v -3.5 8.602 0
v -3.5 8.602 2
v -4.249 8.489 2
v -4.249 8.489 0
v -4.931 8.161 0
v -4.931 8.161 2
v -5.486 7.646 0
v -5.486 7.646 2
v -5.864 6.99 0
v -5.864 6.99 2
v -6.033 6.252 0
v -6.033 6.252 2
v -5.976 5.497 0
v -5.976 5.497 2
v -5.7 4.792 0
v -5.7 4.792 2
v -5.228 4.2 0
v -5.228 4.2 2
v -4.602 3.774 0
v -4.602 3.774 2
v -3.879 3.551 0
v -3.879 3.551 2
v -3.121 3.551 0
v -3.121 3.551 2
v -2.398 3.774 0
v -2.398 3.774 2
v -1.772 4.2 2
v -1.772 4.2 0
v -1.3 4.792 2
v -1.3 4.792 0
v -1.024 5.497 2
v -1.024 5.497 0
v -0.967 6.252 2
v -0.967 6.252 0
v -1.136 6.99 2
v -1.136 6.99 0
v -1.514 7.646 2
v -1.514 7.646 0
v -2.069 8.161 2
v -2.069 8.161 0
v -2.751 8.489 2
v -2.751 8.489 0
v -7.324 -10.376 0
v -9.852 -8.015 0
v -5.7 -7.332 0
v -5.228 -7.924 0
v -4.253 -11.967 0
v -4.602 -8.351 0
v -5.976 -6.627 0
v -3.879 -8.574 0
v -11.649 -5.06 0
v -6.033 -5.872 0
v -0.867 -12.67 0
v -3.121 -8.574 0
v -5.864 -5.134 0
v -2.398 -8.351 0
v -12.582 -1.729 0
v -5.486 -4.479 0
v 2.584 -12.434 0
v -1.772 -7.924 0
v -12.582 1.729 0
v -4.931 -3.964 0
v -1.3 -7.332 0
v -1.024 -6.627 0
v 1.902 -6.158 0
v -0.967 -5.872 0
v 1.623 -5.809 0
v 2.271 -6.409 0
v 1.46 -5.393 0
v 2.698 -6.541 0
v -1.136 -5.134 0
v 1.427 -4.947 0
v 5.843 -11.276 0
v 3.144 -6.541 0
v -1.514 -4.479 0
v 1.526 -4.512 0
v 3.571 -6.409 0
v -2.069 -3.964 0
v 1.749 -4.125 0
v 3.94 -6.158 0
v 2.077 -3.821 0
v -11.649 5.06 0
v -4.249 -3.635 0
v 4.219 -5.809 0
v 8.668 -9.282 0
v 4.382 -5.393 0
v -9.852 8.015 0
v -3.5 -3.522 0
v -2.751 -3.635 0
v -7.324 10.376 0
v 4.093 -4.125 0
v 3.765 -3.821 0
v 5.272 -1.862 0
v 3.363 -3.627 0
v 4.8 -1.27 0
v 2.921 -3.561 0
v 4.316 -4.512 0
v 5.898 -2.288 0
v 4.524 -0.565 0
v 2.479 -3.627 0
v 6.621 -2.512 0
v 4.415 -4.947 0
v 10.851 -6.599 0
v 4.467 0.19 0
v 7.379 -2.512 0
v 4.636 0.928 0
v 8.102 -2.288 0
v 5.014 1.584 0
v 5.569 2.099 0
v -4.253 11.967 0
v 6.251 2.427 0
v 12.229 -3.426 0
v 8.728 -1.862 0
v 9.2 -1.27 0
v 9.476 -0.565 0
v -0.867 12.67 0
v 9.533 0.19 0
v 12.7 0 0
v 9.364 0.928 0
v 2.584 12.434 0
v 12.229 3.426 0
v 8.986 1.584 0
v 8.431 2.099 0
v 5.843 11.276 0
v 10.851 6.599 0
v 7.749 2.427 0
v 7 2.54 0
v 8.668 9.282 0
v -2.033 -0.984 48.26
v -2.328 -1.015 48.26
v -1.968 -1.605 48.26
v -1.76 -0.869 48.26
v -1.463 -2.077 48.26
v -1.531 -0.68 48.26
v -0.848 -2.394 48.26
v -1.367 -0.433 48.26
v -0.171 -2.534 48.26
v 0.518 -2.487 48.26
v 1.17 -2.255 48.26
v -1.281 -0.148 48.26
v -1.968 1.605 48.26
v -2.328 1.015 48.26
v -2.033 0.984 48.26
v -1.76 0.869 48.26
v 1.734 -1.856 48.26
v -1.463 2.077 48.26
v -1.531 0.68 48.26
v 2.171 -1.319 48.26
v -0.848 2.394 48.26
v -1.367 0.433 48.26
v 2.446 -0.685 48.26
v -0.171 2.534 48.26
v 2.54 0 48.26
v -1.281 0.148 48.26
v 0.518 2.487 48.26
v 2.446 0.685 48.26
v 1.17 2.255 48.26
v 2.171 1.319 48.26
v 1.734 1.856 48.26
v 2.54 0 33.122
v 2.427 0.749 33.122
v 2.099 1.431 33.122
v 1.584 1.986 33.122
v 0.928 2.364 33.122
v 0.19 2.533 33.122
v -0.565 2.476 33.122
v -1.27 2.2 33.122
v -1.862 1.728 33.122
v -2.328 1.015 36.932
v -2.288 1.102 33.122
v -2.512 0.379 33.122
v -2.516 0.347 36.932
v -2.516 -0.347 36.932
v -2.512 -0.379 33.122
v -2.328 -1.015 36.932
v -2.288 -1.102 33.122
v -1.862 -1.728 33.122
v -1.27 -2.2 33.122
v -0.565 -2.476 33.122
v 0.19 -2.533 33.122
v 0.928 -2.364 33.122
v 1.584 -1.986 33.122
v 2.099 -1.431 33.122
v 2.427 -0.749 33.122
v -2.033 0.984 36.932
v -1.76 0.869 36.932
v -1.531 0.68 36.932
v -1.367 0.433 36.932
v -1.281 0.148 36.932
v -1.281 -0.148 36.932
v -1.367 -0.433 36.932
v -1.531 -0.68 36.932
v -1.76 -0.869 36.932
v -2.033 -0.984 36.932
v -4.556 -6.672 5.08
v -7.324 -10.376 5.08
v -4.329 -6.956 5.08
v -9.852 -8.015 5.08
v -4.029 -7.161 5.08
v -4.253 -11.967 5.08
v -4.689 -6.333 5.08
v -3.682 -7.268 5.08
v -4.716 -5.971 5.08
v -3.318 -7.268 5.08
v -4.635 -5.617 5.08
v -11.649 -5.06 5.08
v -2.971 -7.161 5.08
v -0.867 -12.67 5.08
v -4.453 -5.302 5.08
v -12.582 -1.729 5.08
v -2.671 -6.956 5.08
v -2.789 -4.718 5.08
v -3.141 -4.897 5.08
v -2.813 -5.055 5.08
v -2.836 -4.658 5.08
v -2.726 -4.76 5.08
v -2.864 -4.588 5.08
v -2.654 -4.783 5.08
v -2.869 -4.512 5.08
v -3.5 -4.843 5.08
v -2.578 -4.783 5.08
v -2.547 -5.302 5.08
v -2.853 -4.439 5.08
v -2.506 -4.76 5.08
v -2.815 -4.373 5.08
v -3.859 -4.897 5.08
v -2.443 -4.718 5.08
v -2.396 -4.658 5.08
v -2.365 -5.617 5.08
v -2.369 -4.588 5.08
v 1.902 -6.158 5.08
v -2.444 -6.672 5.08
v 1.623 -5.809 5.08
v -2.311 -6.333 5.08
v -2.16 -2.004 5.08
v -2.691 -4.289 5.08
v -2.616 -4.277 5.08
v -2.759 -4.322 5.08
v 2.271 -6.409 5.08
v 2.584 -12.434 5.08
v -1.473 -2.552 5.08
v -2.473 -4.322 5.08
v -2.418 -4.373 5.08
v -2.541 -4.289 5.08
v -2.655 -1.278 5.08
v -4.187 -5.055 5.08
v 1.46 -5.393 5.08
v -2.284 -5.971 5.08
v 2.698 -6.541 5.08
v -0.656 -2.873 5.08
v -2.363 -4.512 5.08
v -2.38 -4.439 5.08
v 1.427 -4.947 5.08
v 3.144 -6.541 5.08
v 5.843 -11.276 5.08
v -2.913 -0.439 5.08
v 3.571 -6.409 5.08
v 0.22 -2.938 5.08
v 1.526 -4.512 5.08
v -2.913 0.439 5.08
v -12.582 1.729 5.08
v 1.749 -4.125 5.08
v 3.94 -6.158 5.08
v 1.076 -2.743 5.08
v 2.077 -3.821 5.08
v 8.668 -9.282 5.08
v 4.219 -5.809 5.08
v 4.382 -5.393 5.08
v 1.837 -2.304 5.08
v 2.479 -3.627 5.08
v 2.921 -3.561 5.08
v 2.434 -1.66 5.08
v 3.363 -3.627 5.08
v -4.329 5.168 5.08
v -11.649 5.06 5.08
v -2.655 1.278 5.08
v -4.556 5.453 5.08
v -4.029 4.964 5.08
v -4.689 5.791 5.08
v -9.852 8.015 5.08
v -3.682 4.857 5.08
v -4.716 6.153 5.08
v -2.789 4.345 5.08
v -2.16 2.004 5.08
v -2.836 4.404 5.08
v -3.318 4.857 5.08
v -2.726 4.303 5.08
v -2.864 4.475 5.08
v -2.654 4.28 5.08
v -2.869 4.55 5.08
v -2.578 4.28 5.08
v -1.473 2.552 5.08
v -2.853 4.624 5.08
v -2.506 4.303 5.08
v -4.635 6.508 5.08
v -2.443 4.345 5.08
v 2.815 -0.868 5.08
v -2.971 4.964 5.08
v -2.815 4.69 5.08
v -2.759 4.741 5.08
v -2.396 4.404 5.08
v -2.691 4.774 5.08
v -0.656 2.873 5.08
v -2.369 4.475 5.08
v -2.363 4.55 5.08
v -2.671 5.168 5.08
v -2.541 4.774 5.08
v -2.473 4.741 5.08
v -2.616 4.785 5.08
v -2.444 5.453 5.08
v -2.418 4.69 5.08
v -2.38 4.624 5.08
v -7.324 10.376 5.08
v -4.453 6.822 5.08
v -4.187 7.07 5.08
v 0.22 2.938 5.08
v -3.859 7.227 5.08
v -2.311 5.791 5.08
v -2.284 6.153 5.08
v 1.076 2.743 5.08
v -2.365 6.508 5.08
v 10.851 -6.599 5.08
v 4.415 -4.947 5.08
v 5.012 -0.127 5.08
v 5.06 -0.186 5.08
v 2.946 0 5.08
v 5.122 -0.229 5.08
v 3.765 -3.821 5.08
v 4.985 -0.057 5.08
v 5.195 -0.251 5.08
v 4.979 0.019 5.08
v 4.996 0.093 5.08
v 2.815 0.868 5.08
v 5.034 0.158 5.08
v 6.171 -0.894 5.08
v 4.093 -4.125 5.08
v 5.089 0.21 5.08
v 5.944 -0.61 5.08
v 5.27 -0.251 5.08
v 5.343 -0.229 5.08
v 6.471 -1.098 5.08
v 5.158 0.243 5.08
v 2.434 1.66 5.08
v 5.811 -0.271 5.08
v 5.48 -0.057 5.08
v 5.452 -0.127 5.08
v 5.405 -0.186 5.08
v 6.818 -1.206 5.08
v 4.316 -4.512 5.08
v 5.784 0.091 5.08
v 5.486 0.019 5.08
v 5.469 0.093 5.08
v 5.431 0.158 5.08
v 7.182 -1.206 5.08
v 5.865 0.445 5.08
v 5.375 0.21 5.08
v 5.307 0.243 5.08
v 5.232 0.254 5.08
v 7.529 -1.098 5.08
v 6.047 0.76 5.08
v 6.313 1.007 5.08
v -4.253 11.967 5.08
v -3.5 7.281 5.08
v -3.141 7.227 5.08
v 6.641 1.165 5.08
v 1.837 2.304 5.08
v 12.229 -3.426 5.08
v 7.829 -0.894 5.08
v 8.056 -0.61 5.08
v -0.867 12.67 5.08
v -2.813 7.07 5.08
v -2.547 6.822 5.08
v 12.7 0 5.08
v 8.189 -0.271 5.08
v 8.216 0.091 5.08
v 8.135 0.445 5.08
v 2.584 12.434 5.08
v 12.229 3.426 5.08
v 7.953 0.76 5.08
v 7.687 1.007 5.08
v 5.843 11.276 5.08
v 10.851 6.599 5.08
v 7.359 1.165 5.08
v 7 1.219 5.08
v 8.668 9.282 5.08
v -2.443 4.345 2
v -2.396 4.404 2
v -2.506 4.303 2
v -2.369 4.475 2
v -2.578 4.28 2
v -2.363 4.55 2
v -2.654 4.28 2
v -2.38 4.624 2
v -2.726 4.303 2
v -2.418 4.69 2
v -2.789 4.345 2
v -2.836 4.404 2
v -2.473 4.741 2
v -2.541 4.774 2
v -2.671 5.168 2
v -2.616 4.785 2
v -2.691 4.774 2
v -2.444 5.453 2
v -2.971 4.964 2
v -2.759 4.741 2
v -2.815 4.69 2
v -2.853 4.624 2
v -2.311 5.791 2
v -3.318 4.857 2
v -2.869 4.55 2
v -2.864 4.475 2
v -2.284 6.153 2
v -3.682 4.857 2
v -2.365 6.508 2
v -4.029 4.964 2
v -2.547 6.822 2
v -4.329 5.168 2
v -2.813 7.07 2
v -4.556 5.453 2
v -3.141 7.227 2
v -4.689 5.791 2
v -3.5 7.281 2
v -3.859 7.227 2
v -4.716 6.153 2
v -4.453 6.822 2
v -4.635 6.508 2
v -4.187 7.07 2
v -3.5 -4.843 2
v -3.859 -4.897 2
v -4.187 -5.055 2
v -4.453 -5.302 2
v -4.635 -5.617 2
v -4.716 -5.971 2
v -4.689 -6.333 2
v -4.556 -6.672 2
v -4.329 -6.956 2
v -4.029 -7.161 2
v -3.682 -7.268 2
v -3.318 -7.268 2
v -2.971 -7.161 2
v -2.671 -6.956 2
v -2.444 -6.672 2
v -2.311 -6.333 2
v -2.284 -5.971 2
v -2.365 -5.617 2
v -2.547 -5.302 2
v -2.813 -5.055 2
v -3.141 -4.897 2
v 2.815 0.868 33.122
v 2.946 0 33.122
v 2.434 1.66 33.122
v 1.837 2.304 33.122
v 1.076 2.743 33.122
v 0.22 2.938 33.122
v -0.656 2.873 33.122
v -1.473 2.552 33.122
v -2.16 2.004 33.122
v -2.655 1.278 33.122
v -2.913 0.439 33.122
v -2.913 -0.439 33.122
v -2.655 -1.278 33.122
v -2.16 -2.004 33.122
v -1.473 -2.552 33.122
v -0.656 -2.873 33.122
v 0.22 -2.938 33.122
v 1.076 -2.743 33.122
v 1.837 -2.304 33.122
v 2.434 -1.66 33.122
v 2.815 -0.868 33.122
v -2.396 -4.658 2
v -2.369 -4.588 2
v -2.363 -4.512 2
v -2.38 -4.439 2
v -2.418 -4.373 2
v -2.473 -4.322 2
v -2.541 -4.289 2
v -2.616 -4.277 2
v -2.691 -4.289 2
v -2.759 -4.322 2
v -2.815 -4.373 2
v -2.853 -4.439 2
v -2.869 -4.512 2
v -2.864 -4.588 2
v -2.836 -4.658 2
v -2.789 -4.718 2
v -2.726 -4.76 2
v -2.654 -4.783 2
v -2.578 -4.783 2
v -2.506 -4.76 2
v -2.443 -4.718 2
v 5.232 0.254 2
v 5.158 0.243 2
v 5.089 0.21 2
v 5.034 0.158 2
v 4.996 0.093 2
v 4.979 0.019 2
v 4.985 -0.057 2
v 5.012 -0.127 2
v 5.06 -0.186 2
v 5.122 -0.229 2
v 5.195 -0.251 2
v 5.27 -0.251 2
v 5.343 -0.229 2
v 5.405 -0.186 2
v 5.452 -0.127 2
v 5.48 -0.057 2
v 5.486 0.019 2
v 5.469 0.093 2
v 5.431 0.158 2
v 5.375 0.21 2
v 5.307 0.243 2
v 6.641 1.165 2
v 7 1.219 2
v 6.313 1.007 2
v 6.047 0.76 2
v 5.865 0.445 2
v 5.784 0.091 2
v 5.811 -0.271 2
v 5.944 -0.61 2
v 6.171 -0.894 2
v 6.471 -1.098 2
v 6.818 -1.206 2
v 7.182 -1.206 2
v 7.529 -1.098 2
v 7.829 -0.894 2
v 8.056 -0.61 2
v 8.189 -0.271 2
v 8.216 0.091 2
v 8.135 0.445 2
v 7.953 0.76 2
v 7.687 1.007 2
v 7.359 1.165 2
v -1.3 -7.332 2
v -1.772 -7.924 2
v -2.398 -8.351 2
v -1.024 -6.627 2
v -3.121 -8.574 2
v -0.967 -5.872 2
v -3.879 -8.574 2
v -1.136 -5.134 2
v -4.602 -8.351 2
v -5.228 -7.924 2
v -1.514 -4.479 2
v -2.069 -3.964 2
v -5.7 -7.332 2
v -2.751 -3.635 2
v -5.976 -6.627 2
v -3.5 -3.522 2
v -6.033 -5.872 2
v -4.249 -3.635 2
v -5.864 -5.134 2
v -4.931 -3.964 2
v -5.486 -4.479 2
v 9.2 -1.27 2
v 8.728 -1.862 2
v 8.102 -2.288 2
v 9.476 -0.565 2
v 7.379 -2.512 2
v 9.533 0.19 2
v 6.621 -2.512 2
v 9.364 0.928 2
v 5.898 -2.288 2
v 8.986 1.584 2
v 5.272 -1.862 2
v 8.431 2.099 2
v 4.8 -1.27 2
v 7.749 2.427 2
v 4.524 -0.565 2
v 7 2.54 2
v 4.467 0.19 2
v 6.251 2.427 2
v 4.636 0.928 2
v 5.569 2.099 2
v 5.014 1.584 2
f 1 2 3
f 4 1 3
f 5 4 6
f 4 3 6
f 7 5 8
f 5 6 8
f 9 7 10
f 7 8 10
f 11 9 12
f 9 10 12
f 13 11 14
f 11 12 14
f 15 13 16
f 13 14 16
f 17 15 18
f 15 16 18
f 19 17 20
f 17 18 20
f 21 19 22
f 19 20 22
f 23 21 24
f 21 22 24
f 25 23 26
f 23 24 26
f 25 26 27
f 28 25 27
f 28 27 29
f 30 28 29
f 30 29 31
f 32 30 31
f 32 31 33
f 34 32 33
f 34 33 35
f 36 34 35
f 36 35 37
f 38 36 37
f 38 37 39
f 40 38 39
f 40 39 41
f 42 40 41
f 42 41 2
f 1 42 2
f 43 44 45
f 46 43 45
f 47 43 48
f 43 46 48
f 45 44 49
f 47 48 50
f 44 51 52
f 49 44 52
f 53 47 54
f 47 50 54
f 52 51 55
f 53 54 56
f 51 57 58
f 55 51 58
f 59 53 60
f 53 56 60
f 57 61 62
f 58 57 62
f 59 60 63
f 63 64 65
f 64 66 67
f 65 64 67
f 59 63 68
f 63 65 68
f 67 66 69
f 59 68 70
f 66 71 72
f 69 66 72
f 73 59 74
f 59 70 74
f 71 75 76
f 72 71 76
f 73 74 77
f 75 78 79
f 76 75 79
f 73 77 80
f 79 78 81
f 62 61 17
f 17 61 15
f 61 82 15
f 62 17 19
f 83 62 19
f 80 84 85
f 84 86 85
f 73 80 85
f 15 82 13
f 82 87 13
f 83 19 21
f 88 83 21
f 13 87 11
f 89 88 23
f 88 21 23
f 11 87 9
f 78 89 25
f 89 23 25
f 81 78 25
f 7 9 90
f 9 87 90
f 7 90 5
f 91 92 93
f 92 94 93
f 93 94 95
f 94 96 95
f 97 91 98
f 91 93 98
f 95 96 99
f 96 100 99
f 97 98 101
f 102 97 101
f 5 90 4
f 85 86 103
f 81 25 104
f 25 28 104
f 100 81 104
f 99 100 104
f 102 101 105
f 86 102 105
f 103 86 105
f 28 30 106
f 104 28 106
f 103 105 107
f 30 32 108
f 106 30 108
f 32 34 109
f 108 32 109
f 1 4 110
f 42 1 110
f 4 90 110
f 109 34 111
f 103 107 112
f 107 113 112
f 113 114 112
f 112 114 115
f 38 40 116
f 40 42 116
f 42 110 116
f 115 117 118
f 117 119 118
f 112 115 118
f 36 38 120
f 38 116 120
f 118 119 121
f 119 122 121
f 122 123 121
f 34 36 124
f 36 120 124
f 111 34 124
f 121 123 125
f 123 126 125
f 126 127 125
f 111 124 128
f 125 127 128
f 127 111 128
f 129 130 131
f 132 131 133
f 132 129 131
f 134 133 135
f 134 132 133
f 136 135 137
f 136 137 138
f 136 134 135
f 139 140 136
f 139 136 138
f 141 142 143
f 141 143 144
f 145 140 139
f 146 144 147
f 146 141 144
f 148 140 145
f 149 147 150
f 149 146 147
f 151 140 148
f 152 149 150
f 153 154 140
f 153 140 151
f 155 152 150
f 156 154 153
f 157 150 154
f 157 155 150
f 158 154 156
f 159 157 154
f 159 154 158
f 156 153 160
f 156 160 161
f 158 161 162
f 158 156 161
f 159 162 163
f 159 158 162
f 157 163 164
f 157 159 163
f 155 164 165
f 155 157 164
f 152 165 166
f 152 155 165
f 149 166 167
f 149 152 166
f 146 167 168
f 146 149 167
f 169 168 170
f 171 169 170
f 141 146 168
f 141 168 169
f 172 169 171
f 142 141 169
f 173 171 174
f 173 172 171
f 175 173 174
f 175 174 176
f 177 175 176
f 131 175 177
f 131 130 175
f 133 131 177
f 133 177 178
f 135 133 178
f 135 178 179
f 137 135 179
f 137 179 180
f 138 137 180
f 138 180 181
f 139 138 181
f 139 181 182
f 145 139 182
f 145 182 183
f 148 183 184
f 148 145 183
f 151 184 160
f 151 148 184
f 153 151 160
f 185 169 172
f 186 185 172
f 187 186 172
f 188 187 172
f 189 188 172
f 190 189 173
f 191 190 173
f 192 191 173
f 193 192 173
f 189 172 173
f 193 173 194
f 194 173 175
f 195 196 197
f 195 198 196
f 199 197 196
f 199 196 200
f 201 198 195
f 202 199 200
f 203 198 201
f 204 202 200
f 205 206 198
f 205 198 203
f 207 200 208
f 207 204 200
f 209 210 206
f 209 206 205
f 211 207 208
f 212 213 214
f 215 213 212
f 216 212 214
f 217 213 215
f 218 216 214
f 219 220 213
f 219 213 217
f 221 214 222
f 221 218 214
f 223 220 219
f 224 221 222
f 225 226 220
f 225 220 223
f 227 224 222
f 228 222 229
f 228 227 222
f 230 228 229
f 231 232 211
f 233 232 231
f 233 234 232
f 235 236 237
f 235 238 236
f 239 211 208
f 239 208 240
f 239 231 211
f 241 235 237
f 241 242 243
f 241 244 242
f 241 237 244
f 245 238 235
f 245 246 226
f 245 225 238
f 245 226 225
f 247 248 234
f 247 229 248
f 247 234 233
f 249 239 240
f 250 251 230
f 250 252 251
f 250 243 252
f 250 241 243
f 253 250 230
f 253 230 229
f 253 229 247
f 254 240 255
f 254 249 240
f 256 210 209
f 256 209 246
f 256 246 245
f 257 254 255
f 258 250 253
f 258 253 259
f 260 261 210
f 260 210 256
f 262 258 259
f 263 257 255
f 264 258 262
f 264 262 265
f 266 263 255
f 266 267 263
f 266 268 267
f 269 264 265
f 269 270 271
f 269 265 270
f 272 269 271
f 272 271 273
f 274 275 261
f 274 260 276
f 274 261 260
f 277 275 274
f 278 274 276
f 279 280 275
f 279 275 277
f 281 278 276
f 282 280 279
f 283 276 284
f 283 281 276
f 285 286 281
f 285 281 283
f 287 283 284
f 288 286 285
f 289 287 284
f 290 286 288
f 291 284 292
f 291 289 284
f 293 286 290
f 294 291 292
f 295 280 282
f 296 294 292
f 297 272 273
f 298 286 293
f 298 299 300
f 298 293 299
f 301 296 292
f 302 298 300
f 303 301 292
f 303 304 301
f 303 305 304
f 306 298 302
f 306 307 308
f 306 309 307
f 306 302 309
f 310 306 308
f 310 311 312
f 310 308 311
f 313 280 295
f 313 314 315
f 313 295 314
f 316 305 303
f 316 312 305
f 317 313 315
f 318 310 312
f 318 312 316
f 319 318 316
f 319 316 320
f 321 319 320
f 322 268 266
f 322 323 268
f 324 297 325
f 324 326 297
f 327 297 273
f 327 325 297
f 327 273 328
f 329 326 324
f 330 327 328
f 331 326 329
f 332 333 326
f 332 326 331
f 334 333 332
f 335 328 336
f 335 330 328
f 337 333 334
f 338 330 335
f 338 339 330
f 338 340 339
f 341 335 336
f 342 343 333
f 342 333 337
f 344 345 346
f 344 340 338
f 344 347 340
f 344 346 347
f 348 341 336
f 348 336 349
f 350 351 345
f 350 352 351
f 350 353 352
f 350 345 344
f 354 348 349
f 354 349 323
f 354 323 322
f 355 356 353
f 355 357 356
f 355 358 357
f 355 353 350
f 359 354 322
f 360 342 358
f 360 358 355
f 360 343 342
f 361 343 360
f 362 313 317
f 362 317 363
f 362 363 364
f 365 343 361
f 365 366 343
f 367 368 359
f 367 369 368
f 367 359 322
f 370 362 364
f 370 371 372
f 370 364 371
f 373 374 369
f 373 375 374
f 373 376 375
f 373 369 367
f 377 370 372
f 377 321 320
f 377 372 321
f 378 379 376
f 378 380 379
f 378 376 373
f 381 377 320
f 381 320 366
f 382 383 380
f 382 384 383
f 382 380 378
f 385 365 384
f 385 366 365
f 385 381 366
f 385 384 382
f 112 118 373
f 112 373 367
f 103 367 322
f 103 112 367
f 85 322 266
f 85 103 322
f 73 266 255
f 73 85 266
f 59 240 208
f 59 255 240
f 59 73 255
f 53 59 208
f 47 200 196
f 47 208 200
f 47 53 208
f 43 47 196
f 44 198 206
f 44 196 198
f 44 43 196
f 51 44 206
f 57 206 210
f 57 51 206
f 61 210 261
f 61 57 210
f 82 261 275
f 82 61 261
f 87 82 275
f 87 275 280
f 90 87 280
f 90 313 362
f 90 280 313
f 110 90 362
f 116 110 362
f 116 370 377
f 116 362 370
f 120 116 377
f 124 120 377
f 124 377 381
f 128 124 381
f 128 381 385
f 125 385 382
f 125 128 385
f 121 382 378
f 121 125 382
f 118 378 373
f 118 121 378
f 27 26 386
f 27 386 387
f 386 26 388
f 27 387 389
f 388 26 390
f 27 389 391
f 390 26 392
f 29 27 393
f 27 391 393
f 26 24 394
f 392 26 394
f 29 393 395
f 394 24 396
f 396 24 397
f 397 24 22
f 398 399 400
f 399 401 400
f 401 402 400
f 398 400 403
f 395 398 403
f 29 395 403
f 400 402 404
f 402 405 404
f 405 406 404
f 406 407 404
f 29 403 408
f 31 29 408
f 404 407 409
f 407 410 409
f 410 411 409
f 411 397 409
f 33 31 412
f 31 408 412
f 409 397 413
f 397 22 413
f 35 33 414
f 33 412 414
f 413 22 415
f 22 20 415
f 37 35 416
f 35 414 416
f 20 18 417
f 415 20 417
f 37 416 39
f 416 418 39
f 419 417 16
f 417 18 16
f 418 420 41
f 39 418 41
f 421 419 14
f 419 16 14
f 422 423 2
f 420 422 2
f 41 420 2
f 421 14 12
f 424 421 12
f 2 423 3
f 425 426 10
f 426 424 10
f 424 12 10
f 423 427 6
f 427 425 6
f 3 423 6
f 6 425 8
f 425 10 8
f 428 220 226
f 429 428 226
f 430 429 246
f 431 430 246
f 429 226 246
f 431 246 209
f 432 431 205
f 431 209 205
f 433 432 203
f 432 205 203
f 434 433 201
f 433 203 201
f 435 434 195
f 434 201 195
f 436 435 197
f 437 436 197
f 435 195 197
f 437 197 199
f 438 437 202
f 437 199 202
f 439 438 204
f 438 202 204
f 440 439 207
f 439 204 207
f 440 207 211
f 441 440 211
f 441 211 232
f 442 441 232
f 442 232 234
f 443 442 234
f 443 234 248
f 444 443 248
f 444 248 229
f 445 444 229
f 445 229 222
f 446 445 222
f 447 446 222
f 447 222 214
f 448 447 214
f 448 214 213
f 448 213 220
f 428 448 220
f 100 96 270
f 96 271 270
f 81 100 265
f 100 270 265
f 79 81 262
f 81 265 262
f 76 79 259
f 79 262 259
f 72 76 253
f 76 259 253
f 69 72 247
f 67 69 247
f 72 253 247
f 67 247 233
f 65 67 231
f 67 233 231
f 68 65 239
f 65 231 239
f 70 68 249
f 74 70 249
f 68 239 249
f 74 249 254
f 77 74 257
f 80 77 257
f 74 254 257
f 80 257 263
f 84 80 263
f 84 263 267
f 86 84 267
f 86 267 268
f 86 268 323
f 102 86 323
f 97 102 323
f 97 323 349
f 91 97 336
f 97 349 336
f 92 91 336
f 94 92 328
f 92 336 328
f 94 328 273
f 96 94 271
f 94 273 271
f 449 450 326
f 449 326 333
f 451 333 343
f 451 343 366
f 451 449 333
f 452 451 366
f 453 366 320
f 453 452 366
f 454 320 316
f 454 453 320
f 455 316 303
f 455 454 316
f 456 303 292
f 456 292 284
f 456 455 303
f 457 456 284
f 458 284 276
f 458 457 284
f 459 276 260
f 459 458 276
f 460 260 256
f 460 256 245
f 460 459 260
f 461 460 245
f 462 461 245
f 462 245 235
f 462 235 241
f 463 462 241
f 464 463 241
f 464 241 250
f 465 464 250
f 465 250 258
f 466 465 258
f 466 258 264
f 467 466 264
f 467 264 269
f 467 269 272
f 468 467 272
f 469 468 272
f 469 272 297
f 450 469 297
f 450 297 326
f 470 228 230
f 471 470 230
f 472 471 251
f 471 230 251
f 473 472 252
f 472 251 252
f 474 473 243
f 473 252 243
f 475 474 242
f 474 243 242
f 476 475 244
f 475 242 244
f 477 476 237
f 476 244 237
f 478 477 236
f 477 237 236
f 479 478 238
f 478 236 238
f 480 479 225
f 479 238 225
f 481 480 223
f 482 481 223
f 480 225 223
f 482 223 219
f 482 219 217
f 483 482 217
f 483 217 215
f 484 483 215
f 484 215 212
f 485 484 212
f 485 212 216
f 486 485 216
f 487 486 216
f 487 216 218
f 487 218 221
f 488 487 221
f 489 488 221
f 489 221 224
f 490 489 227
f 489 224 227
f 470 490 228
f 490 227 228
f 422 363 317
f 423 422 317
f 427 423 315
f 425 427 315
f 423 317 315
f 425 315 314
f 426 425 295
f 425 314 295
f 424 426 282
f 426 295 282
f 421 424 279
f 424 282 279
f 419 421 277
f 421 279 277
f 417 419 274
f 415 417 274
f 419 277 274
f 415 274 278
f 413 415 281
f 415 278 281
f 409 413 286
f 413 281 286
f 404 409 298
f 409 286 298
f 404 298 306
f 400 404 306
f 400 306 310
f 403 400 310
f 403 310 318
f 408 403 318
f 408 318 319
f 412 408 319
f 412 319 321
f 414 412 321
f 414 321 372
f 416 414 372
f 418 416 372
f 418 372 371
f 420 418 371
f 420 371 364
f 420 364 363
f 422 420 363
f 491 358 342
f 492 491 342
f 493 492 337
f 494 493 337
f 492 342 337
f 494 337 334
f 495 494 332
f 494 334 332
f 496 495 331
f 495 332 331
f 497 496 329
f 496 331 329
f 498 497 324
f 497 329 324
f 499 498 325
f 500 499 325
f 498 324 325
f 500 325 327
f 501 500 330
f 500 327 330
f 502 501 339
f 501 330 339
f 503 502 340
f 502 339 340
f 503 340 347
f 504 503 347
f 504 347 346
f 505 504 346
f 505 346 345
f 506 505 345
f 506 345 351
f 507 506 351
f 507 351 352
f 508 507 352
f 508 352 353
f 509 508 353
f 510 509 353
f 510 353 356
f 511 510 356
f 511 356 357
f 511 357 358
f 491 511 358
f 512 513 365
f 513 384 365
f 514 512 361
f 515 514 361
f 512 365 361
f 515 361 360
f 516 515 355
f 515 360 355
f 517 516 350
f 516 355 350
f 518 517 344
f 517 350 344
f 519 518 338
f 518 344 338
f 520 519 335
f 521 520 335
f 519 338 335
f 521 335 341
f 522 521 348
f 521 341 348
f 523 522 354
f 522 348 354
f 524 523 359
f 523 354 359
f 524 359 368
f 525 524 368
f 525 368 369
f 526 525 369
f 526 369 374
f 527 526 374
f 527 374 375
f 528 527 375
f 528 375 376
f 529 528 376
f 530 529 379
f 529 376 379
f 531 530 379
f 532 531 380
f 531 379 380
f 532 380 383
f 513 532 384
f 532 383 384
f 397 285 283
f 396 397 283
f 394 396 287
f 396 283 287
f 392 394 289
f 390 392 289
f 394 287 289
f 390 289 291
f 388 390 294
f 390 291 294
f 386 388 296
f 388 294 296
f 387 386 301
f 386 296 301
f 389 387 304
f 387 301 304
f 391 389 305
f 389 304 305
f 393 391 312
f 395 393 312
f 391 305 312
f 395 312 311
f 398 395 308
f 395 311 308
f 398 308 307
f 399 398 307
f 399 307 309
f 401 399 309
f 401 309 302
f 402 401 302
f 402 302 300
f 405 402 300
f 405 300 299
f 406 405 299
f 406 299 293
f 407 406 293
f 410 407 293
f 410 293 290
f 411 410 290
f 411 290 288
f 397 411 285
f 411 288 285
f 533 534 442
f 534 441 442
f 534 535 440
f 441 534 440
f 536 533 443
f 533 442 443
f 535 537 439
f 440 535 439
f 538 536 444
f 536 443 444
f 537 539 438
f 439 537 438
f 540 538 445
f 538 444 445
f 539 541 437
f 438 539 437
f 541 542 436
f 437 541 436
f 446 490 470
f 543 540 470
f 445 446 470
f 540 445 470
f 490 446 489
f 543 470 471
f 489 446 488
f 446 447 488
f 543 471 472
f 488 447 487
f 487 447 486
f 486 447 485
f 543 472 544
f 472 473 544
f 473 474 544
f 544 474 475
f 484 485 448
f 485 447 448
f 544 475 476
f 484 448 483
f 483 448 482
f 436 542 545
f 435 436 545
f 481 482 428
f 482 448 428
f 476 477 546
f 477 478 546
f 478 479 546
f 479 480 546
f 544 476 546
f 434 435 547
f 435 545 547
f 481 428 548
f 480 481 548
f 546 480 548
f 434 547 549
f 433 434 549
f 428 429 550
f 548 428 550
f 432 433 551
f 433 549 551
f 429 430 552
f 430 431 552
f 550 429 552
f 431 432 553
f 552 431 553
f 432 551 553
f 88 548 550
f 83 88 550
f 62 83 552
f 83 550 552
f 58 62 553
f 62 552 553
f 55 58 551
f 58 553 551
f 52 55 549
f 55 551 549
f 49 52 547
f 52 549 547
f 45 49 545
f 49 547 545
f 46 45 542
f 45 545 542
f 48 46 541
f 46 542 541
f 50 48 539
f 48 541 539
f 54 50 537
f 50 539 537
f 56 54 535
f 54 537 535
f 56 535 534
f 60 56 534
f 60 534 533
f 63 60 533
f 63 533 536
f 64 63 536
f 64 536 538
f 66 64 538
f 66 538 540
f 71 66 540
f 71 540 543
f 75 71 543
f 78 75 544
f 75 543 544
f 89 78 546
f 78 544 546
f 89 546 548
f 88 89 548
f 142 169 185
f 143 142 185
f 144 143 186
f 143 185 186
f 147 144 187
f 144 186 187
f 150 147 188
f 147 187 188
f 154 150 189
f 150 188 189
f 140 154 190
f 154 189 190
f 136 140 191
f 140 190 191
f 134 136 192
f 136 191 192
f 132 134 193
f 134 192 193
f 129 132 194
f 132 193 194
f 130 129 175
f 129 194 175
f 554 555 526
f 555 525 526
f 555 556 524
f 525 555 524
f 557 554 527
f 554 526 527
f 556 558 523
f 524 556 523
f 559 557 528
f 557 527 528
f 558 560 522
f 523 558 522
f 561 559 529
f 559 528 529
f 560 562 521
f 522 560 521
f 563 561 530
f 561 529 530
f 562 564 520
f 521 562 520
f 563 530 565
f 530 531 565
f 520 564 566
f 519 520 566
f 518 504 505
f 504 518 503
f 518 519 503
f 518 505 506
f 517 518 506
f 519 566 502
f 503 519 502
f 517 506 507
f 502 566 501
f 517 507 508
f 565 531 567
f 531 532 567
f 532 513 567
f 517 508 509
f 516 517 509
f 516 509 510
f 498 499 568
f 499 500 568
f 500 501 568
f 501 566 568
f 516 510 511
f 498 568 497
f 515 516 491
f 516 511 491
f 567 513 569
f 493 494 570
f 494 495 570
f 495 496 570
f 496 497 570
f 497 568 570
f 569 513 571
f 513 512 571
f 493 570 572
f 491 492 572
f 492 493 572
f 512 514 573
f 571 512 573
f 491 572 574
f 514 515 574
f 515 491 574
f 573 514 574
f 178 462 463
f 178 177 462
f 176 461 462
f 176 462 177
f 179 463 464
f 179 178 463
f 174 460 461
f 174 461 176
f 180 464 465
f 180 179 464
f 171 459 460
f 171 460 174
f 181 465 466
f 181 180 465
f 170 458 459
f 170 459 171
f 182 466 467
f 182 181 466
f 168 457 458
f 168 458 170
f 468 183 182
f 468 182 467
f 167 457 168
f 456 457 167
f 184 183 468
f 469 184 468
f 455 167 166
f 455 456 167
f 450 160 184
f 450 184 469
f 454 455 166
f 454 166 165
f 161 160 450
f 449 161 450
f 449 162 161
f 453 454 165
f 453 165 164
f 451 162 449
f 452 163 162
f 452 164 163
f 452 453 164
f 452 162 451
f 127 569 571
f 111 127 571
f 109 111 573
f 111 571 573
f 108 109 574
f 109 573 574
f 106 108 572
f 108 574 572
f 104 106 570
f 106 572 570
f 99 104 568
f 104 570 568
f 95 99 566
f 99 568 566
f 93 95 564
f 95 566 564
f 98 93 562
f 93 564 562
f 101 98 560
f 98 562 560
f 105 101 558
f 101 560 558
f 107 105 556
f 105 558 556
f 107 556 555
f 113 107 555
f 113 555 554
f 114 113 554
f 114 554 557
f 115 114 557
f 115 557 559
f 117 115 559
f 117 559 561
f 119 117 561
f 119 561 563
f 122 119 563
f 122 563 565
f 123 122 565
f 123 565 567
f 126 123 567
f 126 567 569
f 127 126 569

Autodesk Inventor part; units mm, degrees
ref_plane "YZ Plane" through (0, 0, 0) normal (1, 0, 0) x (0, 1, 0)
ref_plane "XZ Plane" through (0, 0, 0) normal (0, 1, 0) x (-1, 0, 0)
ref_plane "XY Plane" through (0, 0, 0) normal (0, 0, 1) x (1, 0, 0)
sketch "Sketch1" plane through (0, 0, 0) normal (0, 0, 1) x (1, 0, 0)
  circle A0 centre (0, 0) radius 12.7
  dimension "d0" = 25.4
extrude "Extrusion1" add sketch "Sketch1" along normal blind 48.26
sketch "Sketch2" plane through (0, 0, 48.26) normal (0, 0, 1) x (1, 0, 0)
  circle A0 centre (0, 0) radius 12.7 projected
  circle A1 centre (0, 0) radius 2.9464
  dimension "d3" = 5.8928
extrude "Extrusion2" cut sketch "Sketch2" against normal blind 43.18
sketch "Sketch3" plane through (0, 0, 0) normal (0, 0, -1) x (-1, 0, 0)
  circle A0 centre (-7, 0) radius 0.847
  circle A1 centre (3.5, 6.0622) radius 0.847
  arc A2 (5.3333, -1.3437) -> (5.3333, 1.3437) centre (6, 0) ccw
  circle A3 centre (3.5, -6.0622) radius 0.847
  circle A4 centre (6, 0) radius 1.5
hole "Hole1" at (7, 0, 0) at (-3.5, -6.0622, 0) at (-3.5, 6.0622, 0) direction (0, 0, 1) diameter 2.4384 end through all counterbore diameter 5.08 counterbore depth 2 clearance for "Flat Head Machine Screw (82)" size "#2" standard "Ansi Unified Screw Threads"
sketch "Sketch4" plane through (0, 0, 0) normal (0, 0, -1) x (-1, 0, 0)
  circle A0 centre (0, 0) radius 12.7 projected
  line L0 (0, 0) -> (-2.921, -5.0593)
  line L1 (0, -17.78) -> (0, 17.78) projected
  line L2 (17.78, 0) -> (-17.78, 0) projected
  dimension "d37" = 60
  dimension "d38" = 5.842
hole "Hole2" at (2.921, -5.0593, 0) direction (0, 0, 1) diameter 2.9972 end through all
sketch "Sketch5" plane through (0, 0, 5.08) normal (0, 0, 1) x (1, 0, 0)
  circle A0 centre (-3.5, 6.0622) radius 1.2192 projected
  circle A1 centre (-3.5, -6.0622) radius 1.2192 projected
  circle A2 centre (7, 0) radius 1.2192 projected
  circle A3 centre (0, 0) radius 2.9464 projected
  circle A4 centre (0, 0) radius 12.7 projected
  circle A5 centre (2.921, -5.0593) radius 1.4986 projected
ref_plane "Top Ref" through (0, 0, 37.4401) normal (0, 0, 1) x (1, 0, 0)
ref_plane "Bottom Ref" through (0, 0, 15.08) normal (0, 0, 1) x (1, 0, 0)
ref_plane "Work Plane4" through (0, 0, 33.6301) normal (0, 0, 1) x (1, 0, 0)
ref_plane "Work Plane5" through (0, 0, 33.1221) normal (0, 0, 1) x (1, 0, 0)
ref_plane "Work Plane6" through (0, 0, 36.9321) normal (0, 0, 1) x (1, 0, 0)
sketch "Sketch6" plane through (0, 0, 48.26) normal (0, 0, 1) x (1, 0, 0)
  circle A0 centre (0, 0) radius 2.9464 projected
  circle A1 centre (0, 0) radius 2.54
  dimension "d25" = 5.08
extrude "Extrusion3" cut sketch "Sketch6" against normal up to surface (15.1379 mm away)
sketch "Sketch7" plane through (0, 0, 48.26) normal (0, 0, 1) x (1, 0, 0)
  circle A0 centre (0, 0) radius 2.54 projected
  circle A1 centre (-2.286, 0) radius 1.016
  dimension "d28" = 2.032
  dimension "d29" = 2.286
hole "Hole3" at (-2.286, 0, 48.26) direction (0, 0, -1) diameter 2.032 depth 11.3279
sketch "Sketch8" plane through (0, 0, 0) normal (0, 0, -1) x (-1, 0, 0)
  circle A0 centre (0, 0) radius 12.7 projected
  point P0 (-5.2324, 0)
  dimension "d42" = 5.2324
hole "Hole4" at (5.2324, 0, 0) direction (0, 0, 1) diameter 0.508 end through all
pattern_circular "Circular Pattern1" count 3 over 360 about axis through (0, 0, -10) along (0, 0, 1) of "Hole4"
properties part number "Jig_TopHeightAligner"
